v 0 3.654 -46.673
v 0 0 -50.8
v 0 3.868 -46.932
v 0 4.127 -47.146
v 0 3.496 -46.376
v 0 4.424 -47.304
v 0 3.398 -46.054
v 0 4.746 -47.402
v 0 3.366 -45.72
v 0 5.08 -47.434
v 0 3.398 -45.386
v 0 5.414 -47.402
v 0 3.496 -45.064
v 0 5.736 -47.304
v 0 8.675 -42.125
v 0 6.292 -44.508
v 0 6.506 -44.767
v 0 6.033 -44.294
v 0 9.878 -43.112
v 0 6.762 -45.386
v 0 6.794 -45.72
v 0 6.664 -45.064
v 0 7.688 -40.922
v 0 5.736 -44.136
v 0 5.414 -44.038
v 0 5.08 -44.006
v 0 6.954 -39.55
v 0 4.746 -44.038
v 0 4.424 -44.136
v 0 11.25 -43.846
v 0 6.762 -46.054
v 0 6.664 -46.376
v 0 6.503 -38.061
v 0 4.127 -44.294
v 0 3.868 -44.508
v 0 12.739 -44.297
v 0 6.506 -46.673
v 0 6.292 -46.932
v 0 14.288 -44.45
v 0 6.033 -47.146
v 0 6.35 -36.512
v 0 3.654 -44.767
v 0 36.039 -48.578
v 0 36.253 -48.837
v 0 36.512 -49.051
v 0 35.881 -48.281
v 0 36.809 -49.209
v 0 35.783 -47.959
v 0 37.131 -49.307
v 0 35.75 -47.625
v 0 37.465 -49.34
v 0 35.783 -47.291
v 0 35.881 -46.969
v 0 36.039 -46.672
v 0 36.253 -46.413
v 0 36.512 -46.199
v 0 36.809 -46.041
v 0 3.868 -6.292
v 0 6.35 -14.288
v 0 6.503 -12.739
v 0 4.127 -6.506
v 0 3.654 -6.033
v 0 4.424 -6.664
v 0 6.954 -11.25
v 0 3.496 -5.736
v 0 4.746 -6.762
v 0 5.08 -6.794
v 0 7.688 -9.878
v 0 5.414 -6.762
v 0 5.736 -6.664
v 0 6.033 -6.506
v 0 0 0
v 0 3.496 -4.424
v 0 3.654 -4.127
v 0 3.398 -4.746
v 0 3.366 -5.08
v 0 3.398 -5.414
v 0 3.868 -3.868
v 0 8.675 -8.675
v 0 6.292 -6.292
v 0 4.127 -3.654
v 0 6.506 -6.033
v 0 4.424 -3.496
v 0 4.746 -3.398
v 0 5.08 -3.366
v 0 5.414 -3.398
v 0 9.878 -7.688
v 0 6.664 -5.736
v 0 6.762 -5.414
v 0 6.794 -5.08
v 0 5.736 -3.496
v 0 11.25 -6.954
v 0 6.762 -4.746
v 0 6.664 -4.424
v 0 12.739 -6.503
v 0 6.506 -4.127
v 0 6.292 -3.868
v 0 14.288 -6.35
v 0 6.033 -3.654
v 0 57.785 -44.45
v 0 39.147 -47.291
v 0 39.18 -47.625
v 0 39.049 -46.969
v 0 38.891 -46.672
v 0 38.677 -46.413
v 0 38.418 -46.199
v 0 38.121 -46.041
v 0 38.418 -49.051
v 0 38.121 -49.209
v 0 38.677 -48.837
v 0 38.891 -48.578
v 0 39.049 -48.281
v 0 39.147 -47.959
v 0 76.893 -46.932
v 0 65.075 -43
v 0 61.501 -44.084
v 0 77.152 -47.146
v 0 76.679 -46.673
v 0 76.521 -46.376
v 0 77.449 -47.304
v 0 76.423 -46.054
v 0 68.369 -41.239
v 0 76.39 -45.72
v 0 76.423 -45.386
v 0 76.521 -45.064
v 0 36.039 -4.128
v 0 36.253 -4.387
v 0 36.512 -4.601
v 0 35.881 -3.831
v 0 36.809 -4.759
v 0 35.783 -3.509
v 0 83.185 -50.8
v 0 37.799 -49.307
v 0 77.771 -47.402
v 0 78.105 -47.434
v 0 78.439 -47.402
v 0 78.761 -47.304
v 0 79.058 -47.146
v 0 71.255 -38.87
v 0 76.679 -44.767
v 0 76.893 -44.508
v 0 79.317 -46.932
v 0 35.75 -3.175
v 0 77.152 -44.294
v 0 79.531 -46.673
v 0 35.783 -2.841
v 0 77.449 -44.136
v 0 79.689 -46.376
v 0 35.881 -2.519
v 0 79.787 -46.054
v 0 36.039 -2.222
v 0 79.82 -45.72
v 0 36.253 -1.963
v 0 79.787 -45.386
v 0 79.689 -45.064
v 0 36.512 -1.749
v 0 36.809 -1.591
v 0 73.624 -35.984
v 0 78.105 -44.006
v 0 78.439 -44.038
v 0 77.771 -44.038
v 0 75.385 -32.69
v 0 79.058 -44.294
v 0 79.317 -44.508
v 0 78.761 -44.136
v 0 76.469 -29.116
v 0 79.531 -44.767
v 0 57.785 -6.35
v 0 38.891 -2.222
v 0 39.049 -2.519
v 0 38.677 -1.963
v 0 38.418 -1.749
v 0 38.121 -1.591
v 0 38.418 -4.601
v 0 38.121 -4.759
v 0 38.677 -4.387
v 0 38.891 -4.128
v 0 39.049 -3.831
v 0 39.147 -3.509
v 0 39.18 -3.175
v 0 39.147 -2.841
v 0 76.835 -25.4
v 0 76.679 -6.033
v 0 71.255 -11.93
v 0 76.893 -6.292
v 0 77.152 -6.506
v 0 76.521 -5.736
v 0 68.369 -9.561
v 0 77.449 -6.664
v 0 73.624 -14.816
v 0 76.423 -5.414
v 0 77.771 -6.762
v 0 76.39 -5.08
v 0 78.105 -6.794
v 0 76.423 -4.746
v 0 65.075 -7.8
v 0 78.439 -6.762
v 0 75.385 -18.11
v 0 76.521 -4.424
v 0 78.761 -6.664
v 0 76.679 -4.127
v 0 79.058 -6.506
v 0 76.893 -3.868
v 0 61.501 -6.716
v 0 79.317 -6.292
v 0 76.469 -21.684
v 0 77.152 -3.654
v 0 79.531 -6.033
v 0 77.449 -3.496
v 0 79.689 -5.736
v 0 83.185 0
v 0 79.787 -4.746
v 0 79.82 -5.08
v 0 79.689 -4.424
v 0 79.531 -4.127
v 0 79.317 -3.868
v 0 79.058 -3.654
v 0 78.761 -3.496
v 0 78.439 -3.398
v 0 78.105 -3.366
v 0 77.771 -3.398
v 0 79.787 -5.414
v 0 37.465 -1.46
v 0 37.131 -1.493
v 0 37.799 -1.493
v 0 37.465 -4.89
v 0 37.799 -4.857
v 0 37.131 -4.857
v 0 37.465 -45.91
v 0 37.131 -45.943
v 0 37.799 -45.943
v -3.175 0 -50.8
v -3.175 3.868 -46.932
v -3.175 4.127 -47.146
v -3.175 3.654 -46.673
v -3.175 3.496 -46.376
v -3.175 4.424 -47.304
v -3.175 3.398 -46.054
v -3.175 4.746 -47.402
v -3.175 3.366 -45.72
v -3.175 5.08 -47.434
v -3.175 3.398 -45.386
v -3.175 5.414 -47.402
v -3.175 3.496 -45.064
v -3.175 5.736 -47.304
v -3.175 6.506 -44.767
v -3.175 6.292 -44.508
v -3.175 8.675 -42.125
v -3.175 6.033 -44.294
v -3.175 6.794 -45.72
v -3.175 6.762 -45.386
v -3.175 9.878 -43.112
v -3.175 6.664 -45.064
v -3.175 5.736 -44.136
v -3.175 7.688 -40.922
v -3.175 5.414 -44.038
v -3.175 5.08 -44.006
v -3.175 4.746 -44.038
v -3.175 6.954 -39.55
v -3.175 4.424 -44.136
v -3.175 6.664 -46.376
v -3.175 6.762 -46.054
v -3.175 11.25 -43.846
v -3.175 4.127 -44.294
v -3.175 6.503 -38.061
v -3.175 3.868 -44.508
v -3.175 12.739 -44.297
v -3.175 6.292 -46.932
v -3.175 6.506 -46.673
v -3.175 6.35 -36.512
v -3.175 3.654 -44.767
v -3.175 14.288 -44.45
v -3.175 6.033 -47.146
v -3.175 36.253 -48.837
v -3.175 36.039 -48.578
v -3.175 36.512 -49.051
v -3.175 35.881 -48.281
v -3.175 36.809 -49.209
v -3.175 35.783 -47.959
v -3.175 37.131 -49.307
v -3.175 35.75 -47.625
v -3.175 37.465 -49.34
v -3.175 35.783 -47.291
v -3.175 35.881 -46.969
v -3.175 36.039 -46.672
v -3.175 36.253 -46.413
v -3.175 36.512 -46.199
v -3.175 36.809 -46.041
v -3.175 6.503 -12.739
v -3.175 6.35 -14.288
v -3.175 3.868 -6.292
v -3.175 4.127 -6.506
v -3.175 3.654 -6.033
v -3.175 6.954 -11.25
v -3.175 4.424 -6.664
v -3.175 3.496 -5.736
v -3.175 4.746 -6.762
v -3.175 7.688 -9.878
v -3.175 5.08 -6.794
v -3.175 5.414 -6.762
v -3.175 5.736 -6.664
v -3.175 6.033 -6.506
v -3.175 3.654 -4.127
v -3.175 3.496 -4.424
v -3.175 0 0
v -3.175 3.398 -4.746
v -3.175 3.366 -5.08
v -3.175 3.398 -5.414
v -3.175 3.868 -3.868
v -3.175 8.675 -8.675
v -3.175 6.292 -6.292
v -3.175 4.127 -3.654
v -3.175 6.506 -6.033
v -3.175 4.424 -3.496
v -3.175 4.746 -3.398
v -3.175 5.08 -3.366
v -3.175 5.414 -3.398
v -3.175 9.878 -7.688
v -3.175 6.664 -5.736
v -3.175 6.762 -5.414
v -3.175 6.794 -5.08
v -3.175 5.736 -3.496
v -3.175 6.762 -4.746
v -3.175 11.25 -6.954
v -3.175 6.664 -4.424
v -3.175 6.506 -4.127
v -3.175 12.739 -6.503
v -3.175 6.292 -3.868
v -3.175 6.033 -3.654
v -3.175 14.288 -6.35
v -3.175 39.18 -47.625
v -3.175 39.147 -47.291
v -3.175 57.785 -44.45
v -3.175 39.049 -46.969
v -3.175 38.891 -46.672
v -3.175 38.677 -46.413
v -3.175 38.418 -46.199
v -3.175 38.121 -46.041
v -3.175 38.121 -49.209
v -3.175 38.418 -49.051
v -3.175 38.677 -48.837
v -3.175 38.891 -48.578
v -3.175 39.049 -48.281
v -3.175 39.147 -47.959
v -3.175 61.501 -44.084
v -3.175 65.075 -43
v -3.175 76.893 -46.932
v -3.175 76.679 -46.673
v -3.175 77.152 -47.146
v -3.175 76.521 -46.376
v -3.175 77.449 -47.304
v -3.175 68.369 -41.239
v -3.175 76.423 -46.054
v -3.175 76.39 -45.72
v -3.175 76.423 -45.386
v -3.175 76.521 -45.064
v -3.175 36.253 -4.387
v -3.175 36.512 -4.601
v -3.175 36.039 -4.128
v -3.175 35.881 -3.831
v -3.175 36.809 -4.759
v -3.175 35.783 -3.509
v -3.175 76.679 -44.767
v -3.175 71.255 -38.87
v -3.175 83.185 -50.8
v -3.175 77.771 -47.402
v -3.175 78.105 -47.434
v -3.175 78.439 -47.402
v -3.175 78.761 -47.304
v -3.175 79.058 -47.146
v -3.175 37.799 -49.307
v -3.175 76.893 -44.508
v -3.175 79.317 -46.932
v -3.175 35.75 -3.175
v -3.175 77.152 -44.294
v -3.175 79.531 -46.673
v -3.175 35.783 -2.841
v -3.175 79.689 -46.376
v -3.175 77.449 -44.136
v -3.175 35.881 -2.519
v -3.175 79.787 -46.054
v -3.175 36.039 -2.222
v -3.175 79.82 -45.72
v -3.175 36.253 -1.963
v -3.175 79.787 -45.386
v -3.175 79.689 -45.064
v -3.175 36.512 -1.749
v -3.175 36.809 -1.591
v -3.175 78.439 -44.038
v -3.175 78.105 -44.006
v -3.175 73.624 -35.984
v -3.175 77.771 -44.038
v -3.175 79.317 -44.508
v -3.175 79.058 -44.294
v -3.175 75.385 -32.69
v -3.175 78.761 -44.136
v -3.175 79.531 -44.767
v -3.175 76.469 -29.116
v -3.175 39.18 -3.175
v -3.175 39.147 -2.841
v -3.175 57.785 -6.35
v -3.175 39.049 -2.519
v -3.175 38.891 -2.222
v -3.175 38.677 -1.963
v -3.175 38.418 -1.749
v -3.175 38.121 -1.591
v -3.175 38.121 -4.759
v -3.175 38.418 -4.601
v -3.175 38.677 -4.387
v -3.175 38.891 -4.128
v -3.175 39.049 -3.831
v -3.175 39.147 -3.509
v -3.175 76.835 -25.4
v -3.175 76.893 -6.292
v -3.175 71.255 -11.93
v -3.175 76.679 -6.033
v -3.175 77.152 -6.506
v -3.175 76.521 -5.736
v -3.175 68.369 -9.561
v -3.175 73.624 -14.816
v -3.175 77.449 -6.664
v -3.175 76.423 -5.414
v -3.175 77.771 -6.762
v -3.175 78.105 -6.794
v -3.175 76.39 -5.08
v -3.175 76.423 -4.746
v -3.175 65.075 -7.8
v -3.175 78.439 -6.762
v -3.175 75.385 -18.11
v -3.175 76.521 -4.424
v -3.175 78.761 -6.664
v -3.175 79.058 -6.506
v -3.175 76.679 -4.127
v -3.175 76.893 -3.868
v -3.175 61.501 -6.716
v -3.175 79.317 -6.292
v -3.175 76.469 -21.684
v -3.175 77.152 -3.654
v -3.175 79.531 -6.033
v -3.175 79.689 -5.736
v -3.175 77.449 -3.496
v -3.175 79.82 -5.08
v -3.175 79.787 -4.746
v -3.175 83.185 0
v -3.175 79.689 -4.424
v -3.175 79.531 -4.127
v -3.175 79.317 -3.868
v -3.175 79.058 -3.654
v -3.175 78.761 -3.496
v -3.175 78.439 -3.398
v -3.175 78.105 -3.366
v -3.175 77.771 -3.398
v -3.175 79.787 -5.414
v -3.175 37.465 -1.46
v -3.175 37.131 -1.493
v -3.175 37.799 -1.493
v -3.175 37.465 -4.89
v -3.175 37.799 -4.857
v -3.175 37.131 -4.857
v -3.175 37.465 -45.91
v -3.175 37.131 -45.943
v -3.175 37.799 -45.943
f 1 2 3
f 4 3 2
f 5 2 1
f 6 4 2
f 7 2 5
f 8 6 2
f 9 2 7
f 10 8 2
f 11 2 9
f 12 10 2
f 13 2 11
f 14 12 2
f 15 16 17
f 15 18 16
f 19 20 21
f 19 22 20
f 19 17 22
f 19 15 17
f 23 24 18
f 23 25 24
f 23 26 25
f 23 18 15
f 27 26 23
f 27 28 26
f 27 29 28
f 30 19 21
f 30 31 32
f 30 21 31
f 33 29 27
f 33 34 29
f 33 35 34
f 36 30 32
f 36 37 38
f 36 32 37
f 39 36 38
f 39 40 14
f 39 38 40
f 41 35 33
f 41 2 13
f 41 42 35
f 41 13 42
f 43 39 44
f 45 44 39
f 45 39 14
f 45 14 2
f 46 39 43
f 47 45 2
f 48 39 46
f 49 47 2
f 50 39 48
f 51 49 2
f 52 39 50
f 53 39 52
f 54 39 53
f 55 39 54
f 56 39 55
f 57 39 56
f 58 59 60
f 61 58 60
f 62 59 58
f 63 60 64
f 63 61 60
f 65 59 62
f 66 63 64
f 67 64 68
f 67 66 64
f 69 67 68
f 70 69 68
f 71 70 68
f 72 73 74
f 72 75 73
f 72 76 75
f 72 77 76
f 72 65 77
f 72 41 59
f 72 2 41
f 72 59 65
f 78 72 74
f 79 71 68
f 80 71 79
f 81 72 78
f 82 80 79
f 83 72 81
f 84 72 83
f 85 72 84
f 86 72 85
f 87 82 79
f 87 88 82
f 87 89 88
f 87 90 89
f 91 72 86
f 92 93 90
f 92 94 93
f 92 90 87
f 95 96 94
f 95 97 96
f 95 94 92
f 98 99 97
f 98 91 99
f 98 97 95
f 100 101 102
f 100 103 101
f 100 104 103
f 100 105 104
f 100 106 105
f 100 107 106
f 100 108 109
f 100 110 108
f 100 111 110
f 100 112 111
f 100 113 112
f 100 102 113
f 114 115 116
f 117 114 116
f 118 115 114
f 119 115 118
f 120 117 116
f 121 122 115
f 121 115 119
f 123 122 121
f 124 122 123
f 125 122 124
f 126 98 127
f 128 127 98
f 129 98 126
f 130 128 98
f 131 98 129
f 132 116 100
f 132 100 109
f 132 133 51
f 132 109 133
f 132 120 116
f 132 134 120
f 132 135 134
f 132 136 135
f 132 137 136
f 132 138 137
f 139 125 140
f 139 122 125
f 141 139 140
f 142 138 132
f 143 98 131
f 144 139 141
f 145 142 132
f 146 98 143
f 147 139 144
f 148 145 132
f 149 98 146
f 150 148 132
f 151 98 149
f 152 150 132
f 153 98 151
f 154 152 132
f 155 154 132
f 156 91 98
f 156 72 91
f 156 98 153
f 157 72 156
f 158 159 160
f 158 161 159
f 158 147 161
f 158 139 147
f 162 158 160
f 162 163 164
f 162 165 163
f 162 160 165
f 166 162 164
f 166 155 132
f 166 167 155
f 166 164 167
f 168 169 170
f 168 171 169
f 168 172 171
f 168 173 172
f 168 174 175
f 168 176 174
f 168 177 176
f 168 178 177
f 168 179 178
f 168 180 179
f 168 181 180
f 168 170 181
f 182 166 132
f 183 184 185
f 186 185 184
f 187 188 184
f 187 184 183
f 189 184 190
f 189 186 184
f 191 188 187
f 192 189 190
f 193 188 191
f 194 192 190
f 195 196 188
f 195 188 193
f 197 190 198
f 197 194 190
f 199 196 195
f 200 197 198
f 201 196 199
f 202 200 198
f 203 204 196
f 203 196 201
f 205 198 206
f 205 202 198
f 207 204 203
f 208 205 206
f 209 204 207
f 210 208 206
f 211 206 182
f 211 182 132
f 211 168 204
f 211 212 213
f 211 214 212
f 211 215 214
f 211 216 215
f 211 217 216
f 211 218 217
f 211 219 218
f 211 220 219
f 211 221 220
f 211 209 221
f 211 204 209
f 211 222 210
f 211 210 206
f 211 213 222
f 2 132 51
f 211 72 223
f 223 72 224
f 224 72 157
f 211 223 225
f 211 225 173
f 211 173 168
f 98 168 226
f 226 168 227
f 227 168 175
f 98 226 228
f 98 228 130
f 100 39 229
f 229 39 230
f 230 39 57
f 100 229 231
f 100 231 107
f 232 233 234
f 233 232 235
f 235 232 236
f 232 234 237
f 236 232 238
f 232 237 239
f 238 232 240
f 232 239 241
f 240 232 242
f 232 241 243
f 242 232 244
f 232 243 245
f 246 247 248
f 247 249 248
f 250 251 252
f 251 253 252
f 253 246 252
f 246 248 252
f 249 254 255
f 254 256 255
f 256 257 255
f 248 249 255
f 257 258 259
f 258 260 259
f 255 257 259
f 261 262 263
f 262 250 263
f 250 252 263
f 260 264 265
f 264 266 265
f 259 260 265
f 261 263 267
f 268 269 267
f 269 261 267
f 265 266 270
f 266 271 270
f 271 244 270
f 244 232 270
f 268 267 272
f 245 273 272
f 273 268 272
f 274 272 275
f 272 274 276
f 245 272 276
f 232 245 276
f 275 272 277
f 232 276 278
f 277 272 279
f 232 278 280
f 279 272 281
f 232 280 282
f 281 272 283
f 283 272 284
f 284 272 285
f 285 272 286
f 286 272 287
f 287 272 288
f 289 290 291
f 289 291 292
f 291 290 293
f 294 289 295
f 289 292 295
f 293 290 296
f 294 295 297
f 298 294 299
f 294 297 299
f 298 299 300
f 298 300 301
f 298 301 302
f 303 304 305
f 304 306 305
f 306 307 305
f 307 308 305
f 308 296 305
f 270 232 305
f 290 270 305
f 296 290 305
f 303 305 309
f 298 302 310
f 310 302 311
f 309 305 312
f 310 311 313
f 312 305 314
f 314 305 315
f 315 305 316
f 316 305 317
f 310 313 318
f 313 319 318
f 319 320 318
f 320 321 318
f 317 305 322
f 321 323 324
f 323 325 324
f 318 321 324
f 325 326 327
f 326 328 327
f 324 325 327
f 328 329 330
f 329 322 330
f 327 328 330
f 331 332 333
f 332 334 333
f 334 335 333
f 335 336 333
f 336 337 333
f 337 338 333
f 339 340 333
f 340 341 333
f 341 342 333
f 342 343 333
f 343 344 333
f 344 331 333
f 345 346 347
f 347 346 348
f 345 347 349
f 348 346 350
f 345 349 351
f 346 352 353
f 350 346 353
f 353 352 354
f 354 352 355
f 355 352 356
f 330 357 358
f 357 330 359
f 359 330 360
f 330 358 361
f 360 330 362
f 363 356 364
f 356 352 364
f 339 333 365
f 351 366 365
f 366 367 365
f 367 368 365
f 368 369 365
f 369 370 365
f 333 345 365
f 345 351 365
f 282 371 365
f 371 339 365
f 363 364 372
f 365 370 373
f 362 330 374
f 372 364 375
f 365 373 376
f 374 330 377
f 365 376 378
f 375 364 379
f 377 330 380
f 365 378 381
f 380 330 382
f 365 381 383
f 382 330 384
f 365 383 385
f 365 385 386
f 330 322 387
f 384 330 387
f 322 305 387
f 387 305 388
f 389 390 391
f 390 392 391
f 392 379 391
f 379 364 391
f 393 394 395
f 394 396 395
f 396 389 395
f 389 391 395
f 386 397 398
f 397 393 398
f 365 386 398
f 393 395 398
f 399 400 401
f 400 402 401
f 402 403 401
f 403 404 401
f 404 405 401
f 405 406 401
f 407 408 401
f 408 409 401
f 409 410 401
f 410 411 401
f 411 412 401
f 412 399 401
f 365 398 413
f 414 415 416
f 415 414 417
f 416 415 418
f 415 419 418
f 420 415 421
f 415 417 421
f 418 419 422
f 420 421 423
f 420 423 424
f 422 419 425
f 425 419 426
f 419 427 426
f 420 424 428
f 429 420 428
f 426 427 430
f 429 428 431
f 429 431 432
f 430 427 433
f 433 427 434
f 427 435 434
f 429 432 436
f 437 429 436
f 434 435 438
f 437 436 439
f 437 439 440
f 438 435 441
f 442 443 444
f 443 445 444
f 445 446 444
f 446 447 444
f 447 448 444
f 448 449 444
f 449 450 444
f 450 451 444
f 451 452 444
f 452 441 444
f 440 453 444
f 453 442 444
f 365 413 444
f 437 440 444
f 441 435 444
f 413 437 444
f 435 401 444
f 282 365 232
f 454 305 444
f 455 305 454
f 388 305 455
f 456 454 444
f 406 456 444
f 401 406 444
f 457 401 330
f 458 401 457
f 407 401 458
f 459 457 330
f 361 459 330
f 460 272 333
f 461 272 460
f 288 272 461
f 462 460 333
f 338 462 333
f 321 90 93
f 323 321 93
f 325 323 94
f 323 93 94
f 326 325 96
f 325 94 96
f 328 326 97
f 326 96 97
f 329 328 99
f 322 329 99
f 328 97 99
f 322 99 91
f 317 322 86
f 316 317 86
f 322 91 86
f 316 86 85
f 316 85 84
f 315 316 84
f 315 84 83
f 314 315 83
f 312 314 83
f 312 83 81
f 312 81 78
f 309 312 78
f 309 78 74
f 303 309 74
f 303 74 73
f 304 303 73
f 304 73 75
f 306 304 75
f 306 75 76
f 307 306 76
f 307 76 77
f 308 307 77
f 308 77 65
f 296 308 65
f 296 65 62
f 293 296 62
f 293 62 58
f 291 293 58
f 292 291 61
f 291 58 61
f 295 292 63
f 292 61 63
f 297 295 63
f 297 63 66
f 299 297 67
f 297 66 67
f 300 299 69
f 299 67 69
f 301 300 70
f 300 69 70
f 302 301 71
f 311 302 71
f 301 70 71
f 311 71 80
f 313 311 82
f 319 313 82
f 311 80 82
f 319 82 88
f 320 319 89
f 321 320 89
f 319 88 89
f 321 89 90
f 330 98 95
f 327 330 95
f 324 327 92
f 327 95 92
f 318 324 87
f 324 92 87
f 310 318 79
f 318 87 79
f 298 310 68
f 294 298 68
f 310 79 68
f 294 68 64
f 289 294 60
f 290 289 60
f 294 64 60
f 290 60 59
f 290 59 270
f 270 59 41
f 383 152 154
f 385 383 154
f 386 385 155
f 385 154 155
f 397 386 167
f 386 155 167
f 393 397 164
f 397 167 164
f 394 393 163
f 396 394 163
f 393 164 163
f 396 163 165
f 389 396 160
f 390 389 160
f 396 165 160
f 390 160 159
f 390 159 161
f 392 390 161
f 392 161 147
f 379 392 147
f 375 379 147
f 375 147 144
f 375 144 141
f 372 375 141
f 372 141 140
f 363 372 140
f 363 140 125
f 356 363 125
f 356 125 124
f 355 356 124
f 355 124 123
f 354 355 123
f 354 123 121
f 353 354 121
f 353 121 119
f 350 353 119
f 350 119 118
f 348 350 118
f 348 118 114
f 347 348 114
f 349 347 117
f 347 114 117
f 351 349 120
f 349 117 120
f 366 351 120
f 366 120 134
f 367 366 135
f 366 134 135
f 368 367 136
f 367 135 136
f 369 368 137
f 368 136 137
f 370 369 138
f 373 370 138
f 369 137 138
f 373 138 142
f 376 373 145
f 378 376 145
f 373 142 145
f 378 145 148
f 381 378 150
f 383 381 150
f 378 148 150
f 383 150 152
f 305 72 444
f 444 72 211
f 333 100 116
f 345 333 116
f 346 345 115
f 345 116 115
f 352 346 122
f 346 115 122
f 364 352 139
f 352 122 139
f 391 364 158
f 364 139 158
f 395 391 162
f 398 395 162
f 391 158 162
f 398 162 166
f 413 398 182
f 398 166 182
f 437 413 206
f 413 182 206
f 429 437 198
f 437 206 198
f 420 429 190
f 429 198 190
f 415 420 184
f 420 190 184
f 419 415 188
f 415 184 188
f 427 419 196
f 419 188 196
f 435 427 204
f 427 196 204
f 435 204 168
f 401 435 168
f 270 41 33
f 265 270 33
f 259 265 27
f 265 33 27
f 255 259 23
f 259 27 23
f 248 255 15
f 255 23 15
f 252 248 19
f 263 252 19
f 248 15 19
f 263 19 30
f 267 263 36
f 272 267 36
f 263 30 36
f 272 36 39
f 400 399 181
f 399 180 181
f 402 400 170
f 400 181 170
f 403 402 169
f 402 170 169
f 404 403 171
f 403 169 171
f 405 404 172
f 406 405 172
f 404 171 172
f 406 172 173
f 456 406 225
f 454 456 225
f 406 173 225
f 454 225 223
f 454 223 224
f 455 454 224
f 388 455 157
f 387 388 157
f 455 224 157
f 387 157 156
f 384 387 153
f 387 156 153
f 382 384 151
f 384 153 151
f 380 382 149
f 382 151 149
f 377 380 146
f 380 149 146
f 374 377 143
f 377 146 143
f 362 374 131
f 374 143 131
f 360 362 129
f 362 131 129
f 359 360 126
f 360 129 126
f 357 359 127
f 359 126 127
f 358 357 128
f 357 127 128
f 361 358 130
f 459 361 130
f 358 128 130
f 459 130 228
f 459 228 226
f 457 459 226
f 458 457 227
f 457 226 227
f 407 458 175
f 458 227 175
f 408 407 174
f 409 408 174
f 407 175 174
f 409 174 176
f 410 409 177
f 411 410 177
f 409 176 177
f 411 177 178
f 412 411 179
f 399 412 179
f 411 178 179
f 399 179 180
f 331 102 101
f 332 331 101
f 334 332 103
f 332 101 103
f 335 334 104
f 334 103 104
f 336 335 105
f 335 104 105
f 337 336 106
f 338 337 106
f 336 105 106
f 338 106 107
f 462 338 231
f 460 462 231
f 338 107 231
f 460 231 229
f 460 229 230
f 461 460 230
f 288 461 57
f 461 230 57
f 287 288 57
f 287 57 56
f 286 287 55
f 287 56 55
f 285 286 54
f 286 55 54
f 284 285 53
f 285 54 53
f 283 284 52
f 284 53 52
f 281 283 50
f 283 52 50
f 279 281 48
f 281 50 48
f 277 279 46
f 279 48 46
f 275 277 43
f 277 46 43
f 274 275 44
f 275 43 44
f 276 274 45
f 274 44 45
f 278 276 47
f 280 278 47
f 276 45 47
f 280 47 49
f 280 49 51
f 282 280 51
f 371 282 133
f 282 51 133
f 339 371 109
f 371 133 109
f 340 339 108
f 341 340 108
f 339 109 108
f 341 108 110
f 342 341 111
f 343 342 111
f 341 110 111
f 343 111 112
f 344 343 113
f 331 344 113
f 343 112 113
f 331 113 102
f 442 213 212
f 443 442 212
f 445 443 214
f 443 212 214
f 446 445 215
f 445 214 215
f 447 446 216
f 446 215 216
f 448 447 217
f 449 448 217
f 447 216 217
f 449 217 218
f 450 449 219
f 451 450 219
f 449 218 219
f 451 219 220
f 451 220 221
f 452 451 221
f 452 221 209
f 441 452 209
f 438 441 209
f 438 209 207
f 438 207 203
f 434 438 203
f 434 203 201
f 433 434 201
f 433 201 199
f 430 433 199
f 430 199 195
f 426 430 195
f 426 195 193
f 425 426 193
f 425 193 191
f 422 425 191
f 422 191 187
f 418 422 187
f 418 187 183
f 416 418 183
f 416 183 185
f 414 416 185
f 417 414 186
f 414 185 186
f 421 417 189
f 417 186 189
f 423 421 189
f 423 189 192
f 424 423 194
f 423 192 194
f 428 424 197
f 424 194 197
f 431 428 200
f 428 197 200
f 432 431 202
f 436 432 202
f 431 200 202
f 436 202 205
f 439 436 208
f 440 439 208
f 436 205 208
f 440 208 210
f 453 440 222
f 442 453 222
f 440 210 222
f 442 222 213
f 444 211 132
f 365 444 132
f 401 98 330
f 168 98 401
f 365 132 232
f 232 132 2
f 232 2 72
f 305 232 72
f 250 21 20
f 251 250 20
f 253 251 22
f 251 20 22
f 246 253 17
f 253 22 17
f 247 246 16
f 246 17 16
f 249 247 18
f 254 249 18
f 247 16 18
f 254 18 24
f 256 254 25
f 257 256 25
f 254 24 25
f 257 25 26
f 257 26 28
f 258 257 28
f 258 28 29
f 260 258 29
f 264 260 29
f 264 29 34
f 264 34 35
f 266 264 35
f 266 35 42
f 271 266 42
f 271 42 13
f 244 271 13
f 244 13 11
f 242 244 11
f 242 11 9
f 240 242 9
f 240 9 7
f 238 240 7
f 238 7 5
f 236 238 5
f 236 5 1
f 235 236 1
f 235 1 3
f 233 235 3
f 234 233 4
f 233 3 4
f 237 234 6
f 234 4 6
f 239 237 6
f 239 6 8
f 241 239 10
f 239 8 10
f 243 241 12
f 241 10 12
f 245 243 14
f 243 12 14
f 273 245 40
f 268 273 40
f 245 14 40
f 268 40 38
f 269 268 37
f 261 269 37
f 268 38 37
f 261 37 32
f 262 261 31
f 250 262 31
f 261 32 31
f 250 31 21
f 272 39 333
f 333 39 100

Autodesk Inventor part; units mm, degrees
ref_plane "YZ Plane" through (0, 0, 0) normal (1, 0, 0) x (0, 1, 0)
ref_plane "XZ Plane" through (0, 0, 0) normal (0, 1, 0) x (-1, 0, 0)
ref_plane "XY Plane" through (0, 0, 0) normal (0, 0, 1) x (1, 0, 0)
sketch "Sketch1" plane through (0, 0, 0) normal (1, 0, 0) x (0, 1, 0)
  line L0 (0, 0) -> (83.185, 0)
  line L1 (83.185, 0) -> (83.185, -50.8)
  line L2 (83.185, -50.8) -> (0, -50.8)
  line L3 (0, -50.8) -> (0, 0)
  arc A0 (57.785, -44.45) -> (57.785, -6.35) centre (57.785, -25.4) ccw
  arc A1 (14.2875, -6.35) -> (6.35, -14.2875) centre (14.2875, -14.2875) ccw
  arc A2 (6.35, -36.5125) -> (14.2875, -44.45) centre (14.2875, -36.5125) ccw
  line L4 (14.2875, -44.45) -> (57.785, -44.45)
  line L5 (14.2875, -6.35) -> (57.785, -6.35)
  line L6 (6.35, -14.2875) -> (6.35, -36.5125)
  line L7 (57.785, 0) -> (57.785, -50.8)
  circle A3 centre (37.465, -3.175) radius 1.7145
  circle A4 centre (37.465, -47.625) radius 1.7145
  circle A5 centre (5.08, -45.72) radius 1.7145
  circle A6 centre (5.08, -5.08) radius 1.7145
  circle A7 centre (78.105, -5.08) radius 1.7145
  circle A8 centre (78.105, -45.72) radius 1.7145
  dimension "d0" = 83.185
  dimension "d1" = 50.8
  dimension "d2" = 38.1
  dimension "d3" = 25.4
  dimension "d4" = 25.4
  dimension "d5" = 15.875
  dimension "d6" = 15.875
  dimension "d7" = 14.2875
  dimension "d8" = 14.2875
  dimension "d9" = 14.2875
  dimension "d10" = 14.2875
  dimension "d19" = 25.4
  dimension "d20" = 3.175
  dimension "d21" = 3.175
  dimension "d28" = 3.429
  dimension "d29" = 5.08
  dimension "d30" = 5.08
  dimension "d31" = 45.72
  dimension "d32" = 45.72
  dimension "d33" = 3.429
  dimension "d34" = 3.429
  dimension "d35" = 5.08
  dimension "d36" = 5.08
  dimension "d37" = 5.08
  dimension "d38" = 5.08
  dimension "d39" = 5.08
  dimension "d40" = 5.08
extrude "Extrusion1" add sketch "Sketch1" against normal blind 3.175 contours L0 L7 L5 A1 L6 A2 L4 L2 L3 | L0 L1 L2 L7 A0
properties part number "Engine Head Gasket"
